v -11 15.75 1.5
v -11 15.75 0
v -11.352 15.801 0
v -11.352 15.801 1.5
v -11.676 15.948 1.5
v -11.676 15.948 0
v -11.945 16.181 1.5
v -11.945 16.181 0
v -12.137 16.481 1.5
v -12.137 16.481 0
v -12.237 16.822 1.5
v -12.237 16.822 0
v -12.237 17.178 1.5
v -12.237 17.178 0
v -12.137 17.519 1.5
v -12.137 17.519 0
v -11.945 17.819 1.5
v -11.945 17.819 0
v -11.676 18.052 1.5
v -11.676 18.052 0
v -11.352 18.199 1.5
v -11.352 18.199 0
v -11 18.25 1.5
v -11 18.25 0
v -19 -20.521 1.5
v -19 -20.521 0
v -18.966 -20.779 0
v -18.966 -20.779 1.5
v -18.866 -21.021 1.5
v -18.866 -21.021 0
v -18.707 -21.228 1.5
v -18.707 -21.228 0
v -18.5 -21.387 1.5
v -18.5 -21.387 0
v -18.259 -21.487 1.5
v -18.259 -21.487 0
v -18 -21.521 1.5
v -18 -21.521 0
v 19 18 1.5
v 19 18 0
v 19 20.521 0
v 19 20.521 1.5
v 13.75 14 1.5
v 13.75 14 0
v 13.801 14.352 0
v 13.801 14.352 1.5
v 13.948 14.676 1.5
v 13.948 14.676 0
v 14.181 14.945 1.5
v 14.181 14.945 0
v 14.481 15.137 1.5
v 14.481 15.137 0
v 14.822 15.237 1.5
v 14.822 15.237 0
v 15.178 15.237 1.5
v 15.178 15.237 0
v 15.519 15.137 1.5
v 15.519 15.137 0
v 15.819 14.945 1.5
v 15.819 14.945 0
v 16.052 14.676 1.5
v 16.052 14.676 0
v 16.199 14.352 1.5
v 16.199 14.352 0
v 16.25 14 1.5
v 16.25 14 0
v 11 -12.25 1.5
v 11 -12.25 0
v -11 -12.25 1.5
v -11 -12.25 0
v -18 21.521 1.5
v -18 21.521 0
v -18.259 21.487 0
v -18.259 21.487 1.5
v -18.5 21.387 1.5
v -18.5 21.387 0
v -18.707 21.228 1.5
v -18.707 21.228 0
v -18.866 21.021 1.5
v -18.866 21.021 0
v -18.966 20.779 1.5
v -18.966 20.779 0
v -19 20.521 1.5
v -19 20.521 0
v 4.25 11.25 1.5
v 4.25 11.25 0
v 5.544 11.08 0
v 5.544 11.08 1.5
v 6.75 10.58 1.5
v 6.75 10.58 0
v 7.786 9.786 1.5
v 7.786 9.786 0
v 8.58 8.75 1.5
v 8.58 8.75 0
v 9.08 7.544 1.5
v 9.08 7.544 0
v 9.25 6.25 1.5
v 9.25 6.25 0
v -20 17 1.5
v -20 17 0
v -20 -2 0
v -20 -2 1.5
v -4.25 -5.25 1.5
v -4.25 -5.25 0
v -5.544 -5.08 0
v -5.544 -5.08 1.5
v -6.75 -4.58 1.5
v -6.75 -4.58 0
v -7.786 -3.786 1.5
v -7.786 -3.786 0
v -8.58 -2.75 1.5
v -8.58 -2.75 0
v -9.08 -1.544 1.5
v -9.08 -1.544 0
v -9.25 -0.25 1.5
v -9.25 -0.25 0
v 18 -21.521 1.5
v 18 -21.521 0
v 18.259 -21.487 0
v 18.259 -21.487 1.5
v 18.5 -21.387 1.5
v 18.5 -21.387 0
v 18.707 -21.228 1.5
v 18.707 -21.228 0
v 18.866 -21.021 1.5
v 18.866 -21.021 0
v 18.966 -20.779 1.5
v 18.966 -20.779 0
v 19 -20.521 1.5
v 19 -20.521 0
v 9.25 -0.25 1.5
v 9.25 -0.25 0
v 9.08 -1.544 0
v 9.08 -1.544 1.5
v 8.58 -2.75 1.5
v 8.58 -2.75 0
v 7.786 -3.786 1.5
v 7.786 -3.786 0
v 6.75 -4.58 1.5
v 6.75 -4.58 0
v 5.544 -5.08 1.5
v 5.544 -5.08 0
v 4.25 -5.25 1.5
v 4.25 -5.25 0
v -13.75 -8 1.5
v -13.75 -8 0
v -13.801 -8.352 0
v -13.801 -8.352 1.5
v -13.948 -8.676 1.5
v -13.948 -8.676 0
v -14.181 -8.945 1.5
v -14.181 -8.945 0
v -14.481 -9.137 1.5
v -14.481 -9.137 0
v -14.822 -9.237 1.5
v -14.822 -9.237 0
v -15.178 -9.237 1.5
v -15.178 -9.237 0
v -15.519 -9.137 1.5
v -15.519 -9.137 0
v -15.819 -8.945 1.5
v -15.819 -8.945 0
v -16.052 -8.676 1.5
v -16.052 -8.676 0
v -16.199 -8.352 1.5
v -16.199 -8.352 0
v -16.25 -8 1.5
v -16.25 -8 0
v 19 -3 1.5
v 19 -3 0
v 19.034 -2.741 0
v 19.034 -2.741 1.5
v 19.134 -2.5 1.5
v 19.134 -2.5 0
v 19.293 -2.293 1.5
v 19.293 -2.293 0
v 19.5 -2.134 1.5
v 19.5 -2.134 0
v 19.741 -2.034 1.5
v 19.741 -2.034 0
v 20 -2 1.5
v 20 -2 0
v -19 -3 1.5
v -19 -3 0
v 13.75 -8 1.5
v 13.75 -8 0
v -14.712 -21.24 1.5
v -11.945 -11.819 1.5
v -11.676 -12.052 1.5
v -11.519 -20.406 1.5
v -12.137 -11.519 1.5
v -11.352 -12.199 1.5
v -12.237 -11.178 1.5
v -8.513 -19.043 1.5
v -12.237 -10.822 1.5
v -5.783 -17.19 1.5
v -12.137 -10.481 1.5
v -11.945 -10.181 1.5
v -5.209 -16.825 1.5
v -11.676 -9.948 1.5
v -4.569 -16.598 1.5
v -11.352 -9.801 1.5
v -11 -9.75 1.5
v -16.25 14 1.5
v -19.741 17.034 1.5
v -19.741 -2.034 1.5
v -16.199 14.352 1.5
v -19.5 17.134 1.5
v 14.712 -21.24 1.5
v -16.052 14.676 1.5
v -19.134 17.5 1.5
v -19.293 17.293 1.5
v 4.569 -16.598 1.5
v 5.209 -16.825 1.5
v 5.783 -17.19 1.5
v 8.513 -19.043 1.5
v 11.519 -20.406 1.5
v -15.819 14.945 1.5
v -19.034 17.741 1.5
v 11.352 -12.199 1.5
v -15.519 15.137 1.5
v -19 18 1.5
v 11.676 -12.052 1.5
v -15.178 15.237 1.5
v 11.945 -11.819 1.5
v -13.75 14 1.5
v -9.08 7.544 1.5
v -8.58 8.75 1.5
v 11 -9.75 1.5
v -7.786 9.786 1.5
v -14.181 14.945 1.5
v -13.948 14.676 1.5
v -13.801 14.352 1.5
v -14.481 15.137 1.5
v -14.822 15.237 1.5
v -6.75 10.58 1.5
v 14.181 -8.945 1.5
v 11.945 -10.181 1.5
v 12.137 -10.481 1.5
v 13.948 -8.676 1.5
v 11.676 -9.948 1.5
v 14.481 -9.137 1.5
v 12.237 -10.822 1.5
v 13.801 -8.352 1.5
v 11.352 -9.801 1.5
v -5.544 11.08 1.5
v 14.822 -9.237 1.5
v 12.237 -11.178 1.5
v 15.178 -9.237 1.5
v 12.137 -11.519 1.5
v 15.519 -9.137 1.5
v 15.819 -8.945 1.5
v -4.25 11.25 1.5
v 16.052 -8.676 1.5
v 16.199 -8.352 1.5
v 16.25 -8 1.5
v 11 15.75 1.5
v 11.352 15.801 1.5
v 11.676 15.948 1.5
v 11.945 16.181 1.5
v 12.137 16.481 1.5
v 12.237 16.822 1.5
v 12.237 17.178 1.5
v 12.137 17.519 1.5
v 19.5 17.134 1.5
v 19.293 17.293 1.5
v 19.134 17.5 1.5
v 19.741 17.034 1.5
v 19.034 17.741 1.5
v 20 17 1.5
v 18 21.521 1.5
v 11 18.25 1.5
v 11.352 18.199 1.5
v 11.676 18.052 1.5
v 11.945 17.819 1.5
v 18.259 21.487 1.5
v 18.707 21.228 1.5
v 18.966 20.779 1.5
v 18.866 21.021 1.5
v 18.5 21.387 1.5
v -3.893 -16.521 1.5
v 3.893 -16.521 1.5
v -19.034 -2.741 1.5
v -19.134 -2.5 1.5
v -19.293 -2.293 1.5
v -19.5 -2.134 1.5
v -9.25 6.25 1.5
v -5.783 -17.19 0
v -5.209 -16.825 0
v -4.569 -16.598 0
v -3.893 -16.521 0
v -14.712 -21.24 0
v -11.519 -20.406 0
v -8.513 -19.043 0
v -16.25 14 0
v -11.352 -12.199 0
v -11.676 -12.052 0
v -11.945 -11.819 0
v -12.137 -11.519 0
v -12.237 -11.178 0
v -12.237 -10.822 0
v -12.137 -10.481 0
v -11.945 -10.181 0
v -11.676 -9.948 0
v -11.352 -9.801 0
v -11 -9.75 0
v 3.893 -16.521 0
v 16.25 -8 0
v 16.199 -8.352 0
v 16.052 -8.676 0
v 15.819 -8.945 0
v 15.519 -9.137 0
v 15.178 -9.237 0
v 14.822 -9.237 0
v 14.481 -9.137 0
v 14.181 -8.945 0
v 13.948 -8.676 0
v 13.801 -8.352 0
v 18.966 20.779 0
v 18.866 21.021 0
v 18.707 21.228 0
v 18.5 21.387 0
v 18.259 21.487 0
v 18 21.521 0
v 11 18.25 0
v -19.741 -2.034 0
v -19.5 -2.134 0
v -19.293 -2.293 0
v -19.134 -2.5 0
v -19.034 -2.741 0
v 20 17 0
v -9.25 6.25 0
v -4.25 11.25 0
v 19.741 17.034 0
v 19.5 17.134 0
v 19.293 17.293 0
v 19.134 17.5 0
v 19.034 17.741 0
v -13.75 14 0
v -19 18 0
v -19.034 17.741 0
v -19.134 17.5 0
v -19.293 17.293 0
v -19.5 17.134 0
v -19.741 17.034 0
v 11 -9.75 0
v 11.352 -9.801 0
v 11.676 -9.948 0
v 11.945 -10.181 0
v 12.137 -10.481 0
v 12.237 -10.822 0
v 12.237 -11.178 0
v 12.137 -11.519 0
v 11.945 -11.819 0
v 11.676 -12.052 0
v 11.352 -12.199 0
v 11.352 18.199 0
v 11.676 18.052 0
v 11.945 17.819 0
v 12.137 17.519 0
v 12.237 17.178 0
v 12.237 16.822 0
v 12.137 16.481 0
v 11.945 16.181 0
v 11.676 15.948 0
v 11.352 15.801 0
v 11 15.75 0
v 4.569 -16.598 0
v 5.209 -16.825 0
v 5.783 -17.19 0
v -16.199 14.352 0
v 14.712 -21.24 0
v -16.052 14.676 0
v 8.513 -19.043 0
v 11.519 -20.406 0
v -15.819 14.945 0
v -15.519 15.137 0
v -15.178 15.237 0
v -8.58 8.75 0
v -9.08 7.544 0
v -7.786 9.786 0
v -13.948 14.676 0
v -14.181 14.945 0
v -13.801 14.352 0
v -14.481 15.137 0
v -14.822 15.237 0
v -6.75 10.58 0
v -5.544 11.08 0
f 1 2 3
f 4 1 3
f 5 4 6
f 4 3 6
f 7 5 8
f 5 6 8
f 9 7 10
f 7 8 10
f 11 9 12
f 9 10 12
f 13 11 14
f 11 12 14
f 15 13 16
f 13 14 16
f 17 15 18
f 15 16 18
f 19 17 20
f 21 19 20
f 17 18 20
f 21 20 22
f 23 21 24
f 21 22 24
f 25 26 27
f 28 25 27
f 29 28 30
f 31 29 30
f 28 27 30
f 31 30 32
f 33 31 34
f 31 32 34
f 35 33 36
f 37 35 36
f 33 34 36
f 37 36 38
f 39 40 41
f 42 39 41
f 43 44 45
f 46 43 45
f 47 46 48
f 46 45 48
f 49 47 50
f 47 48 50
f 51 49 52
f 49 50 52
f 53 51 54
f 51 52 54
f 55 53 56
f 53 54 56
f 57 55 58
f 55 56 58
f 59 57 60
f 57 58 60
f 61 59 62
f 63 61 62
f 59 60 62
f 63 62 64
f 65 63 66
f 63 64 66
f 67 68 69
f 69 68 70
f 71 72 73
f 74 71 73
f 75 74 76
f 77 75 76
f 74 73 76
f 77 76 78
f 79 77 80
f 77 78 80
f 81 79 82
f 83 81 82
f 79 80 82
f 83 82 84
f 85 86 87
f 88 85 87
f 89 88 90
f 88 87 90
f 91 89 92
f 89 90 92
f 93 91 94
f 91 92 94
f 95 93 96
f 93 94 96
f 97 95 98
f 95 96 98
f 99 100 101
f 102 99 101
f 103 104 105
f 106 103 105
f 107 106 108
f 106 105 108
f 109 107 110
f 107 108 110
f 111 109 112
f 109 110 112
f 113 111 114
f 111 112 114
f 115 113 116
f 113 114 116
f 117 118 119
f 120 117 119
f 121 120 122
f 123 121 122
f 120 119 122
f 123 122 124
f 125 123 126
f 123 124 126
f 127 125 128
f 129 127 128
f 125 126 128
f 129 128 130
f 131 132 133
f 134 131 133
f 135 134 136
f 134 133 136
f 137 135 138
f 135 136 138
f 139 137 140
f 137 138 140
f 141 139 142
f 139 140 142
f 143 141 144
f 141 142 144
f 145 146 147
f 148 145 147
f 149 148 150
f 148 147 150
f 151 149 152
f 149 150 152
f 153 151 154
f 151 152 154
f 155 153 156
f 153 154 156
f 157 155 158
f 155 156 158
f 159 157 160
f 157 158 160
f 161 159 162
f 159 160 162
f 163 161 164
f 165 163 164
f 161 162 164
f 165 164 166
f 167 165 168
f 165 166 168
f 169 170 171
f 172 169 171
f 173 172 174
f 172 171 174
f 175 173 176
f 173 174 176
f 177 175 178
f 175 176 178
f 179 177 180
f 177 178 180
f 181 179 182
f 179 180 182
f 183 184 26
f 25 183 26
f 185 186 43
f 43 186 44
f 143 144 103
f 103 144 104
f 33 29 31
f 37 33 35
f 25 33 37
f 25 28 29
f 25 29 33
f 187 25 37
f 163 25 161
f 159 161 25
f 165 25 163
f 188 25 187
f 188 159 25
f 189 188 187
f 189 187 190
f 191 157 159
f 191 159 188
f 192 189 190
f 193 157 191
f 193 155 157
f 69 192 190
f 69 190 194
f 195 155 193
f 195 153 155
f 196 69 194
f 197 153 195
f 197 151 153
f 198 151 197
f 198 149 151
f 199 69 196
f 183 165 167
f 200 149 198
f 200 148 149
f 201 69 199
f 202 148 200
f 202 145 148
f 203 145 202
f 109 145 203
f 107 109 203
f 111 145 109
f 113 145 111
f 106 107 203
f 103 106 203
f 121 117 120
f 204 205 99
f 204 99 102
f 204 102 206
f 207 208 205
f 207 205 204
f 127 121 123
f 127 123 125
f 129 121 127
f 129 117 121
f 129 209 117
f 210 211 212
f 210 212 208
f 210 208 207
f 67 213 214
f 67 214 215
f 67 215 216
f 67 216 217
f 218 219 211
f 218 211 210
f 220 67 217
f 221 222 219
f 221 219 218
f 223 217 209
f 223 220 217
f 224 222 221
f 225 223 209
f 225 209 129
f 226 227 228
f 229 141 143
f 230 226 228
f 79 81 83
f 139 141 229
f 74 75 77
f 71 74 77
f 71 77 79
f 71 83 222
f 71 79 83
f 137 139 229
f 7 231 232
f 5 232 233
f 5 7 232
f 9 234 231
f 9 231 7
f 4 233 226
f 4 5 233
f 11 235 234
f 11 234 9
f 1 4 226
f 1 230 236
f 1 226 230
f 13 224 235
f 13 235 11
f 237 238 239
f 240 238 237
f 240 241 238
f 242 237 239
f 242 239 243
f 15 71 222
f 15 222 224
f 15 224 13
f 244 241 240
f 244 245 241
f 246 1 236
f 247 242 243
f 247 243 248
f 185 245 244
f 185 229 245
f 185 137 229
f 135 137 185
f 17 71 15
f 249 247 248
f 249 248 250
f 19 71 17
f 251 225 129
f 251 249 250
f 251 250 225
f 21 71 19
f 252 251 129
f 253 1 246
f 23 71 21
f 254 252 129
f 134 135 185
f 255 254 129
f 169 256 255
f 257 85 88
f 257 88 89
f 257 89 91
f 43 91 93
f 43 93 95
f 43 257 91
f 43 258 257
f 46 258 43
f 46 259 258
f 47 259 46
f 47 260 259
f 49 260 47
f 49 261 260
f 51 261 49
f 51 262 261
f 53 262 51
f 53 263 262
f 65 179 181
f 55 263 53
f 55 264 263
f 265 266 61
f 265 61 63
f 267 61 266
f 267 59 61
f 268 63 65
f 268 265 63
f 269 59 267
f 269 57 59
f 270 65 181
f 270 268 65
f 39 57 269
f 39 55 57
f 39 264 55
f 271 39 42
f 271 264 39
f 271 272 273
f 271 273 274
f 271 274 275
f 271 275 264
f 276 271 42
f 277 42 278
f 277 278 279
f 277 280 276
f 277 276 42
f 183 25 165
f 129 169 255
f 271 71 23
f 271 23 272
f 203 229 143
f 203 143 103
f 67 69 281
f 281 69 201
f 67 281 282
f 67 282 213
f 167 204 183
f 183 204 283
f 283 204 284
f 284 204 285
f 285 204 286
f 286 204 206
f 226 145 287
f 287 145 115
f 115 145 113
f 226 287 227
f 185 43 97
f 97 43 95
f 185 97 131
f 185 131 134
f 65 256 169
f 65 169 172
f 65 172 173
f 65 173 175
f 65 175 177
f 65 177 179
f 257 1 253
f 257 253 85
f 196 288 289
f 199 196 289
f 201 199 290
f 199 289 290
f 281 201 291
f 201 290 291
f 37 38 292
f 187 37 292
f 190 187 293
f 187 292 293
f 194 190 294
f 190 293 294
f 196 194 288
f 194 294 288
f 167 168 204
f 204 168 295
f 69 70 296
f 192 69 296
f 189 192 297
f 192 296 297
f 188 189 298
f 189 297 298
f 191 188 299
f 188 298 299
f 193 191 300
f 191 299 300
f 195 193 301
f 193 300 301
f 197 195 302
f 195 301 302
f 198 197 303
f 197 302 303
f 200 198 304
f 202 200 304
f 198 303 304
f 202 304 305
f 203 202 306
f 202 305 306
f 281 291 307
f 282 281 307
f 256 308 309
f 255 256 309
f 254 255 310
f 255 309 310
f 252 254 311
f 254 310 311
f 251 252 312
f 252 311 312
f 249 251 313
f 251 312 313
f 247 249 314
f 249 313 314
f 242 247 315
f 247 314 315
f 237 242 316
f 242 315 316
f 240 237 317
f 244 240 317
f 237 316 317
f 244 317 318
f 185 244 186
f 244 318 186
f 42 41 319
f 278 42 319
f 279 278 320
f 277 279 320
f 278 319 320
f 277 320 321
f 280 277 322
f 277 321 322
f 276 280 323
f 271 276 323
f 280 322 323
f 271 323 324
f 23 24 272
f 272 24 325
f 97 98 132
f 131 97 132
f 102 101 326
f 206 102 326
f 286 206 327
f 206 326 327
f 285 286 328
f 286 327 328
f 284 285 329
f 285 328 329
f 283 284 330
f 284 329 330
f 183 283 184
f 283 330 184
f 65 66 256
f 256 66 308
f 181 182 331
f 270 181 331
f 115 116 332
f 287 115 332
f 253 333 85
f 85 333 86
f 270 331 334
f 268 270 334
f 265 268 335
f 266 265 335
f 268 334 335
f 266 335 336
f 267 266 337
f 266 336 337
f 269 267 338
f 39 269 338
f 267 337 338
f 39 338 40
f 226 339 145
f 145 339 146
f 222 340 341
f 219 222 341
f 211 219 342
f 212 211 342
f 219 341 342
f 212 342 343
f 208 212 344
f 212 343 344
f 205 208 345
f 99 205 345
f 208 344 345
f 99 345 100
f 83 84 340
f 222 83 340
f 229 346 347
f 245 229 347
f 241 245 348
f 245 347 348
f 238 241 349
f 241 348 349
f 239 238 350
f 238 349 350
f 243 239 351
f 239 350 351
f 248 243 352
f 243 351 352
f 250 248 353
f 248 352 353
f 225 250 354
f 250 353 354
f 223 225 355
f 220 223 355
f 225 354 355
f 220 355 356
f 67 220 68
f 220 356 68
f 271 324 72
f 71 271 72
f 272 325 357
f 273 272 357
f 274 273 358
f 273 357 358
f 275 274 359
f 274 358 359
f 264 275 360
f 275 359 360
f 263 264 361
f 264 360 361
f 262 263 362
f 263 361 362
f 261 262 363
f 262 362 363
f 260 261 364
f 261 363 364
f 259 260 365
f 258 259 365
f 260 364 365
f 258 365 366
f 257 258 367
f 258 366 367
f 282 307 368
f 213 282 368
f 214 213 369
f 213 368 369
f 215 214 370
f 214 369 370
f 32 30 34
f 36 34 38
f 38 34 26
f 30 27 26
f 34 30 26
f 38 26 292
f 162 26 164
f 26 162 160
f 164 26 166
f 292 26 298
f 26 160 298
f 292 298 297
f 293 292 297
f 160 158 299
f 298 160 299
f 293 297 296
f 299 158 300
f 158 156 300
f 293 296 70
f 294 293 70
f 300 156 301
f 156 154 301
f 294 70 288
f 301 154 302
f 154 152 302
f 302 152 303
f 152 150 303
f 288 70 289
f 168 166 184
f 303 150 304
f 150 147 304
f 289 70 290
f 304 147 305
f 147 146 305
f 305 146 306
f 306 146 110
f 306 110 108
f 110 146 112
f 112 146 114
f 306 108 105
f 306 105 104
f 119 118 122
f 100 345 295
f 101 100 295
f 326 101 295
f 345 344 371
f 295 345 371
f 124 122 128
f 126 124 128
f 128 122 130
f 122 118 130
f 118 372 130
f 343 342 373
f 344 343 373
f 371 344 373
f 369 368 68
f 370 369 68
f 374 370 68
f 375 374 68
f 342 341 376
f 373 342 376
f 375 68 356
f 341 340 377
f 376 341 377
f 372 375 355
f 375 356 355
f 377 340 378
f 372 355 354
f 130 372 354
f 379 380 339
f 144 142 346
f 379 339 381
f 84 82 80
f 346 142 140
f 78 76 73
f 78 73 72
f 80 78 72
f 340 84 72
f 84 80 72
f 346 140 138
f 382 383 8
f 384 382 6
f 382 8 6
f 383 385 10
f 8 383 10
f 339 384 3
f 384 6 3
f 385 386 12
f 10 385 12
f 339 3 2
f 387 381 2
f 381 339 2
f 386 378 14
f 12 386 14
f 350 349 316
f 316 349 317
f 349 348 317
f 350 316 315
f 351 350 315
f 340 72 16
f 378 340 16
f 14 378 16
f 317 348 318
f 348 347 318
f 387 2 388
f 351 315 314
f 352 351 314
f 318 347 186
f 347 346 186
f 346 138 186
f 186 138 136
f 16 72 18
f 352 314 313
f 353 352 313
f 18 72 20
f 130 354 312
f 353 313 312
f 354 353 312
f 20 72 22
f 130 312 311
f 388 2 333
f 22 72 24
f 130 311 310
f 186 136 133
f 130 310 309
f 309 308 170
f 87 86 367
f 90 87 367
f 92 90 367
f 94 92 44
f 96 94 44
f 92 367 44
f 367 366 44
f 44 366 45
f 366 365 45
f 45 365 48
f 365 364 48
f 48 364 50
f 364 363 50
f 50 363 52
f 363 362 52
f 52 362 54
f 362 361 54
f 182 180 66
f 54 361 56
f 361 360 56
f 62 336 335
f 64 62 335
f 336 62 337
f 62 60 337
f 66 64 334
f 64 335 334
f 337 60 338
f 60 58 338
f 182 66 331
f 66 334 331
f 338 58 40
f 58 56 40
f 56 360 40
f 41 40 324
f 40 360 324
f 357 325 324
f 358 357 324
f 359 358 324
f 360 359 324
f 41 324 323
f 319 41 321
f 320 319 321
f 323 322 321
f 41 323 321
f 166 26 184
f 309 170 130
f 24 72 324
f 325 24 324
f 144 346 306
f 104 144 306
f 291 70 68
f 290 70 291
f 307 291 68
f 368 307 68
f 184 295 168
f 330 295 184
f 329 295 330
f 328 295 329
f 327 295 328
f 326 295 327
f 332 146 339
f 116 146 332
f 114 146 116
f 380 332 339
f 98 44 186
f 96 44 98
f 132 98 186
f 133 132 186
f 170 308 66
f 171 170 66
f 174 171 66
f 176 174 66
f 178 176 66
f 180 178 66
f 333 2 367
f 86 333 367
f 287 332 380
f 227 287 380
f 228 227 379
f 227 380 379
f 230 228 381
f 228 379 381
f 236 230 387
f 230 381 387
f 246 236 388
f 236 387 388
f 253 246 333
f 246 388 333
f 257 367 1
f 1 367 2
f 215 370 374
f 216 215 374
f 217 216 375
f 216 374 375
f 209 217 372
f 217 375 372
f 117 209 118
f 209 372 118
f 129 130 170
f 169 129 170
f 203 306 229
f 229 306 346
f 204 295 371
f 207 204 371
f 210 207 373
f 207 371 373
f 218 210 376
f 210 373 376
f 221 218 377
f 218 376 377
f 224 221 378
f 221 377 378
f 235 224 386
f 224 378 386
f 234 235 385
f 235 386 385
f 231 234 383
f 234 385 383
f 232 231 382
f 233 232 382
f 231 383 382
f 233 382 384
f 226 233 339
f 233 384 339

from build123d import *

# Parameters (mm, degrees)
F1_DEPTH = 1.5


with BuildPart() as f1:
    # F0 (on Top) → F1 (new body)
    with BuildSketch(Plane.XY):
        with BuildLine():
            ThreePointArc((-19, 18), (-19.292893, 17.292893), (-20, 17))
            Line((-20, 17), (-20, -2))
            ThreePointArc((-20, -2), (-19.292893, -2.292893), (-19, -3))
            Line((-19, -3), (-19, -20.520575))
            ThreePointArc((-19, -20.520575), (-18.707107, -21.227682), (-18, -21.520575))
            ThreePointArc((-18, -21.520575), (-11.518915, -20.405966), (-5.782559, -17.190218))
            ThreePointArc((-5.782559, -17.190218), (-4.895494, -16.692937), (-3.893264, -16.520575))
            Line((-3.893264, -16.520575), (3.893264, -16.520575))
            ThreePointArc((3.893264, -16.520575), (4.895494, -16.692937), (5.782559, -17.190218))
            ThreePointArc((5.782559, -17.190218), (11.518915, -20.405966), (18, -21.520575))
            ThreePointArc((18, -21.520575), (18.707107, -21.227682), (19, -20.520575))
            Line((19, -20.520575), (19, -3))
            ThreePointArc((19, -3), (19.292893, -2.292893), (20, -2))
            Line((20, -2), (20, 17))
            ThreePointArc((20, 17), (19.292893, 17.292893), (19, 18))
            Line((19, 18), (19, 20.520575))
            ThreePointArc((19, 20.520575), (18.707107, 21.227682), (18, 21.520575))
            Line((18, 21.520575), (-18, 21.520575))
            ThreePointArc((-18, 21.520575), (-18.707107, 21.227682), (-19, 20.520575))
            Line((-19, 20.520575), (-19, 18))
        make_face()
        with BuildLine():
            Line((-11, -9.75), (11, -9.75))
            ThreePointArc((11, -9.75), (12.25, -11), (11, -12.25))
            Line((11, -12.25), (-11, -12.25))
            ThreePointArc((-11, -12.25), (-12.25, -11), (-11, -9.75))
        make_face(mode=Mode.SUBTRACT)
        with BuildLine():
            Line((-16.25, -8), (-16.25, 14))
            ThreePointArc((-16.25, 14), (-15, 15.25), (-13.75, 14))
            Line((-13.75, 14), (-13.75, -8))
            ThreePointArc((-13.75, -8), (-15, -9.25), (-16.25, -8))
        make_face(mode=Mode.SUBTRACT)
        with BuildLine():
            Line((4.25, -5.25), (-4.25, -5.25))
            ThreePointArc((-4.25, -5.25), (-7.785534, -3.785534), (-9.25, -0.25))
            Line((-9.25, -0.25), (-9.25, 6.25))
            ThreePointArc((-9.25, 6.25), (-7.785534, 9.785534), (-4.25, 11.25))
            Line((-4.25, 11.25), (4.25, 11.25))
            ThreePointArc((4.25, 11.25), (7.785534, 9.785534), (9.25, 6.25))
            Line((9.25, 6.25), (9.25, -0.25))
            ThreePointArc((9.25, -0.25), (7.785534, -3.785534), (4.25, -5.25))
        make_face(mode=Mode.SUBTRACT)
        with BuildLine():
            ThreePointArc((13.75, 14), (15, 15.25), (16.25, 14))
            Line((16.25, 14), (16.25, -8))
            ThreePointArc((16.25, -8), (15, -9.25), (13.75, -8))
            Line((13.75, -8), (13.75, 14))
        make_face(mode=Mode.SUBTRACT)
        with BuildLine():
            Line((-11, 18.25), (11, 18.25))
            ThreePointArc((11, 18.25), (12.25, 17), (11, 15.75))
            Line((11, 15.75), (-11, 15.75))
            ThreePointArc((-11, 15.75), (-12.25, 17), (-11, 18.25))
        make_face(mode=Mode.SUBTRACT)
    extrude(amount=F1_DEPTH)


solid = f1.part
